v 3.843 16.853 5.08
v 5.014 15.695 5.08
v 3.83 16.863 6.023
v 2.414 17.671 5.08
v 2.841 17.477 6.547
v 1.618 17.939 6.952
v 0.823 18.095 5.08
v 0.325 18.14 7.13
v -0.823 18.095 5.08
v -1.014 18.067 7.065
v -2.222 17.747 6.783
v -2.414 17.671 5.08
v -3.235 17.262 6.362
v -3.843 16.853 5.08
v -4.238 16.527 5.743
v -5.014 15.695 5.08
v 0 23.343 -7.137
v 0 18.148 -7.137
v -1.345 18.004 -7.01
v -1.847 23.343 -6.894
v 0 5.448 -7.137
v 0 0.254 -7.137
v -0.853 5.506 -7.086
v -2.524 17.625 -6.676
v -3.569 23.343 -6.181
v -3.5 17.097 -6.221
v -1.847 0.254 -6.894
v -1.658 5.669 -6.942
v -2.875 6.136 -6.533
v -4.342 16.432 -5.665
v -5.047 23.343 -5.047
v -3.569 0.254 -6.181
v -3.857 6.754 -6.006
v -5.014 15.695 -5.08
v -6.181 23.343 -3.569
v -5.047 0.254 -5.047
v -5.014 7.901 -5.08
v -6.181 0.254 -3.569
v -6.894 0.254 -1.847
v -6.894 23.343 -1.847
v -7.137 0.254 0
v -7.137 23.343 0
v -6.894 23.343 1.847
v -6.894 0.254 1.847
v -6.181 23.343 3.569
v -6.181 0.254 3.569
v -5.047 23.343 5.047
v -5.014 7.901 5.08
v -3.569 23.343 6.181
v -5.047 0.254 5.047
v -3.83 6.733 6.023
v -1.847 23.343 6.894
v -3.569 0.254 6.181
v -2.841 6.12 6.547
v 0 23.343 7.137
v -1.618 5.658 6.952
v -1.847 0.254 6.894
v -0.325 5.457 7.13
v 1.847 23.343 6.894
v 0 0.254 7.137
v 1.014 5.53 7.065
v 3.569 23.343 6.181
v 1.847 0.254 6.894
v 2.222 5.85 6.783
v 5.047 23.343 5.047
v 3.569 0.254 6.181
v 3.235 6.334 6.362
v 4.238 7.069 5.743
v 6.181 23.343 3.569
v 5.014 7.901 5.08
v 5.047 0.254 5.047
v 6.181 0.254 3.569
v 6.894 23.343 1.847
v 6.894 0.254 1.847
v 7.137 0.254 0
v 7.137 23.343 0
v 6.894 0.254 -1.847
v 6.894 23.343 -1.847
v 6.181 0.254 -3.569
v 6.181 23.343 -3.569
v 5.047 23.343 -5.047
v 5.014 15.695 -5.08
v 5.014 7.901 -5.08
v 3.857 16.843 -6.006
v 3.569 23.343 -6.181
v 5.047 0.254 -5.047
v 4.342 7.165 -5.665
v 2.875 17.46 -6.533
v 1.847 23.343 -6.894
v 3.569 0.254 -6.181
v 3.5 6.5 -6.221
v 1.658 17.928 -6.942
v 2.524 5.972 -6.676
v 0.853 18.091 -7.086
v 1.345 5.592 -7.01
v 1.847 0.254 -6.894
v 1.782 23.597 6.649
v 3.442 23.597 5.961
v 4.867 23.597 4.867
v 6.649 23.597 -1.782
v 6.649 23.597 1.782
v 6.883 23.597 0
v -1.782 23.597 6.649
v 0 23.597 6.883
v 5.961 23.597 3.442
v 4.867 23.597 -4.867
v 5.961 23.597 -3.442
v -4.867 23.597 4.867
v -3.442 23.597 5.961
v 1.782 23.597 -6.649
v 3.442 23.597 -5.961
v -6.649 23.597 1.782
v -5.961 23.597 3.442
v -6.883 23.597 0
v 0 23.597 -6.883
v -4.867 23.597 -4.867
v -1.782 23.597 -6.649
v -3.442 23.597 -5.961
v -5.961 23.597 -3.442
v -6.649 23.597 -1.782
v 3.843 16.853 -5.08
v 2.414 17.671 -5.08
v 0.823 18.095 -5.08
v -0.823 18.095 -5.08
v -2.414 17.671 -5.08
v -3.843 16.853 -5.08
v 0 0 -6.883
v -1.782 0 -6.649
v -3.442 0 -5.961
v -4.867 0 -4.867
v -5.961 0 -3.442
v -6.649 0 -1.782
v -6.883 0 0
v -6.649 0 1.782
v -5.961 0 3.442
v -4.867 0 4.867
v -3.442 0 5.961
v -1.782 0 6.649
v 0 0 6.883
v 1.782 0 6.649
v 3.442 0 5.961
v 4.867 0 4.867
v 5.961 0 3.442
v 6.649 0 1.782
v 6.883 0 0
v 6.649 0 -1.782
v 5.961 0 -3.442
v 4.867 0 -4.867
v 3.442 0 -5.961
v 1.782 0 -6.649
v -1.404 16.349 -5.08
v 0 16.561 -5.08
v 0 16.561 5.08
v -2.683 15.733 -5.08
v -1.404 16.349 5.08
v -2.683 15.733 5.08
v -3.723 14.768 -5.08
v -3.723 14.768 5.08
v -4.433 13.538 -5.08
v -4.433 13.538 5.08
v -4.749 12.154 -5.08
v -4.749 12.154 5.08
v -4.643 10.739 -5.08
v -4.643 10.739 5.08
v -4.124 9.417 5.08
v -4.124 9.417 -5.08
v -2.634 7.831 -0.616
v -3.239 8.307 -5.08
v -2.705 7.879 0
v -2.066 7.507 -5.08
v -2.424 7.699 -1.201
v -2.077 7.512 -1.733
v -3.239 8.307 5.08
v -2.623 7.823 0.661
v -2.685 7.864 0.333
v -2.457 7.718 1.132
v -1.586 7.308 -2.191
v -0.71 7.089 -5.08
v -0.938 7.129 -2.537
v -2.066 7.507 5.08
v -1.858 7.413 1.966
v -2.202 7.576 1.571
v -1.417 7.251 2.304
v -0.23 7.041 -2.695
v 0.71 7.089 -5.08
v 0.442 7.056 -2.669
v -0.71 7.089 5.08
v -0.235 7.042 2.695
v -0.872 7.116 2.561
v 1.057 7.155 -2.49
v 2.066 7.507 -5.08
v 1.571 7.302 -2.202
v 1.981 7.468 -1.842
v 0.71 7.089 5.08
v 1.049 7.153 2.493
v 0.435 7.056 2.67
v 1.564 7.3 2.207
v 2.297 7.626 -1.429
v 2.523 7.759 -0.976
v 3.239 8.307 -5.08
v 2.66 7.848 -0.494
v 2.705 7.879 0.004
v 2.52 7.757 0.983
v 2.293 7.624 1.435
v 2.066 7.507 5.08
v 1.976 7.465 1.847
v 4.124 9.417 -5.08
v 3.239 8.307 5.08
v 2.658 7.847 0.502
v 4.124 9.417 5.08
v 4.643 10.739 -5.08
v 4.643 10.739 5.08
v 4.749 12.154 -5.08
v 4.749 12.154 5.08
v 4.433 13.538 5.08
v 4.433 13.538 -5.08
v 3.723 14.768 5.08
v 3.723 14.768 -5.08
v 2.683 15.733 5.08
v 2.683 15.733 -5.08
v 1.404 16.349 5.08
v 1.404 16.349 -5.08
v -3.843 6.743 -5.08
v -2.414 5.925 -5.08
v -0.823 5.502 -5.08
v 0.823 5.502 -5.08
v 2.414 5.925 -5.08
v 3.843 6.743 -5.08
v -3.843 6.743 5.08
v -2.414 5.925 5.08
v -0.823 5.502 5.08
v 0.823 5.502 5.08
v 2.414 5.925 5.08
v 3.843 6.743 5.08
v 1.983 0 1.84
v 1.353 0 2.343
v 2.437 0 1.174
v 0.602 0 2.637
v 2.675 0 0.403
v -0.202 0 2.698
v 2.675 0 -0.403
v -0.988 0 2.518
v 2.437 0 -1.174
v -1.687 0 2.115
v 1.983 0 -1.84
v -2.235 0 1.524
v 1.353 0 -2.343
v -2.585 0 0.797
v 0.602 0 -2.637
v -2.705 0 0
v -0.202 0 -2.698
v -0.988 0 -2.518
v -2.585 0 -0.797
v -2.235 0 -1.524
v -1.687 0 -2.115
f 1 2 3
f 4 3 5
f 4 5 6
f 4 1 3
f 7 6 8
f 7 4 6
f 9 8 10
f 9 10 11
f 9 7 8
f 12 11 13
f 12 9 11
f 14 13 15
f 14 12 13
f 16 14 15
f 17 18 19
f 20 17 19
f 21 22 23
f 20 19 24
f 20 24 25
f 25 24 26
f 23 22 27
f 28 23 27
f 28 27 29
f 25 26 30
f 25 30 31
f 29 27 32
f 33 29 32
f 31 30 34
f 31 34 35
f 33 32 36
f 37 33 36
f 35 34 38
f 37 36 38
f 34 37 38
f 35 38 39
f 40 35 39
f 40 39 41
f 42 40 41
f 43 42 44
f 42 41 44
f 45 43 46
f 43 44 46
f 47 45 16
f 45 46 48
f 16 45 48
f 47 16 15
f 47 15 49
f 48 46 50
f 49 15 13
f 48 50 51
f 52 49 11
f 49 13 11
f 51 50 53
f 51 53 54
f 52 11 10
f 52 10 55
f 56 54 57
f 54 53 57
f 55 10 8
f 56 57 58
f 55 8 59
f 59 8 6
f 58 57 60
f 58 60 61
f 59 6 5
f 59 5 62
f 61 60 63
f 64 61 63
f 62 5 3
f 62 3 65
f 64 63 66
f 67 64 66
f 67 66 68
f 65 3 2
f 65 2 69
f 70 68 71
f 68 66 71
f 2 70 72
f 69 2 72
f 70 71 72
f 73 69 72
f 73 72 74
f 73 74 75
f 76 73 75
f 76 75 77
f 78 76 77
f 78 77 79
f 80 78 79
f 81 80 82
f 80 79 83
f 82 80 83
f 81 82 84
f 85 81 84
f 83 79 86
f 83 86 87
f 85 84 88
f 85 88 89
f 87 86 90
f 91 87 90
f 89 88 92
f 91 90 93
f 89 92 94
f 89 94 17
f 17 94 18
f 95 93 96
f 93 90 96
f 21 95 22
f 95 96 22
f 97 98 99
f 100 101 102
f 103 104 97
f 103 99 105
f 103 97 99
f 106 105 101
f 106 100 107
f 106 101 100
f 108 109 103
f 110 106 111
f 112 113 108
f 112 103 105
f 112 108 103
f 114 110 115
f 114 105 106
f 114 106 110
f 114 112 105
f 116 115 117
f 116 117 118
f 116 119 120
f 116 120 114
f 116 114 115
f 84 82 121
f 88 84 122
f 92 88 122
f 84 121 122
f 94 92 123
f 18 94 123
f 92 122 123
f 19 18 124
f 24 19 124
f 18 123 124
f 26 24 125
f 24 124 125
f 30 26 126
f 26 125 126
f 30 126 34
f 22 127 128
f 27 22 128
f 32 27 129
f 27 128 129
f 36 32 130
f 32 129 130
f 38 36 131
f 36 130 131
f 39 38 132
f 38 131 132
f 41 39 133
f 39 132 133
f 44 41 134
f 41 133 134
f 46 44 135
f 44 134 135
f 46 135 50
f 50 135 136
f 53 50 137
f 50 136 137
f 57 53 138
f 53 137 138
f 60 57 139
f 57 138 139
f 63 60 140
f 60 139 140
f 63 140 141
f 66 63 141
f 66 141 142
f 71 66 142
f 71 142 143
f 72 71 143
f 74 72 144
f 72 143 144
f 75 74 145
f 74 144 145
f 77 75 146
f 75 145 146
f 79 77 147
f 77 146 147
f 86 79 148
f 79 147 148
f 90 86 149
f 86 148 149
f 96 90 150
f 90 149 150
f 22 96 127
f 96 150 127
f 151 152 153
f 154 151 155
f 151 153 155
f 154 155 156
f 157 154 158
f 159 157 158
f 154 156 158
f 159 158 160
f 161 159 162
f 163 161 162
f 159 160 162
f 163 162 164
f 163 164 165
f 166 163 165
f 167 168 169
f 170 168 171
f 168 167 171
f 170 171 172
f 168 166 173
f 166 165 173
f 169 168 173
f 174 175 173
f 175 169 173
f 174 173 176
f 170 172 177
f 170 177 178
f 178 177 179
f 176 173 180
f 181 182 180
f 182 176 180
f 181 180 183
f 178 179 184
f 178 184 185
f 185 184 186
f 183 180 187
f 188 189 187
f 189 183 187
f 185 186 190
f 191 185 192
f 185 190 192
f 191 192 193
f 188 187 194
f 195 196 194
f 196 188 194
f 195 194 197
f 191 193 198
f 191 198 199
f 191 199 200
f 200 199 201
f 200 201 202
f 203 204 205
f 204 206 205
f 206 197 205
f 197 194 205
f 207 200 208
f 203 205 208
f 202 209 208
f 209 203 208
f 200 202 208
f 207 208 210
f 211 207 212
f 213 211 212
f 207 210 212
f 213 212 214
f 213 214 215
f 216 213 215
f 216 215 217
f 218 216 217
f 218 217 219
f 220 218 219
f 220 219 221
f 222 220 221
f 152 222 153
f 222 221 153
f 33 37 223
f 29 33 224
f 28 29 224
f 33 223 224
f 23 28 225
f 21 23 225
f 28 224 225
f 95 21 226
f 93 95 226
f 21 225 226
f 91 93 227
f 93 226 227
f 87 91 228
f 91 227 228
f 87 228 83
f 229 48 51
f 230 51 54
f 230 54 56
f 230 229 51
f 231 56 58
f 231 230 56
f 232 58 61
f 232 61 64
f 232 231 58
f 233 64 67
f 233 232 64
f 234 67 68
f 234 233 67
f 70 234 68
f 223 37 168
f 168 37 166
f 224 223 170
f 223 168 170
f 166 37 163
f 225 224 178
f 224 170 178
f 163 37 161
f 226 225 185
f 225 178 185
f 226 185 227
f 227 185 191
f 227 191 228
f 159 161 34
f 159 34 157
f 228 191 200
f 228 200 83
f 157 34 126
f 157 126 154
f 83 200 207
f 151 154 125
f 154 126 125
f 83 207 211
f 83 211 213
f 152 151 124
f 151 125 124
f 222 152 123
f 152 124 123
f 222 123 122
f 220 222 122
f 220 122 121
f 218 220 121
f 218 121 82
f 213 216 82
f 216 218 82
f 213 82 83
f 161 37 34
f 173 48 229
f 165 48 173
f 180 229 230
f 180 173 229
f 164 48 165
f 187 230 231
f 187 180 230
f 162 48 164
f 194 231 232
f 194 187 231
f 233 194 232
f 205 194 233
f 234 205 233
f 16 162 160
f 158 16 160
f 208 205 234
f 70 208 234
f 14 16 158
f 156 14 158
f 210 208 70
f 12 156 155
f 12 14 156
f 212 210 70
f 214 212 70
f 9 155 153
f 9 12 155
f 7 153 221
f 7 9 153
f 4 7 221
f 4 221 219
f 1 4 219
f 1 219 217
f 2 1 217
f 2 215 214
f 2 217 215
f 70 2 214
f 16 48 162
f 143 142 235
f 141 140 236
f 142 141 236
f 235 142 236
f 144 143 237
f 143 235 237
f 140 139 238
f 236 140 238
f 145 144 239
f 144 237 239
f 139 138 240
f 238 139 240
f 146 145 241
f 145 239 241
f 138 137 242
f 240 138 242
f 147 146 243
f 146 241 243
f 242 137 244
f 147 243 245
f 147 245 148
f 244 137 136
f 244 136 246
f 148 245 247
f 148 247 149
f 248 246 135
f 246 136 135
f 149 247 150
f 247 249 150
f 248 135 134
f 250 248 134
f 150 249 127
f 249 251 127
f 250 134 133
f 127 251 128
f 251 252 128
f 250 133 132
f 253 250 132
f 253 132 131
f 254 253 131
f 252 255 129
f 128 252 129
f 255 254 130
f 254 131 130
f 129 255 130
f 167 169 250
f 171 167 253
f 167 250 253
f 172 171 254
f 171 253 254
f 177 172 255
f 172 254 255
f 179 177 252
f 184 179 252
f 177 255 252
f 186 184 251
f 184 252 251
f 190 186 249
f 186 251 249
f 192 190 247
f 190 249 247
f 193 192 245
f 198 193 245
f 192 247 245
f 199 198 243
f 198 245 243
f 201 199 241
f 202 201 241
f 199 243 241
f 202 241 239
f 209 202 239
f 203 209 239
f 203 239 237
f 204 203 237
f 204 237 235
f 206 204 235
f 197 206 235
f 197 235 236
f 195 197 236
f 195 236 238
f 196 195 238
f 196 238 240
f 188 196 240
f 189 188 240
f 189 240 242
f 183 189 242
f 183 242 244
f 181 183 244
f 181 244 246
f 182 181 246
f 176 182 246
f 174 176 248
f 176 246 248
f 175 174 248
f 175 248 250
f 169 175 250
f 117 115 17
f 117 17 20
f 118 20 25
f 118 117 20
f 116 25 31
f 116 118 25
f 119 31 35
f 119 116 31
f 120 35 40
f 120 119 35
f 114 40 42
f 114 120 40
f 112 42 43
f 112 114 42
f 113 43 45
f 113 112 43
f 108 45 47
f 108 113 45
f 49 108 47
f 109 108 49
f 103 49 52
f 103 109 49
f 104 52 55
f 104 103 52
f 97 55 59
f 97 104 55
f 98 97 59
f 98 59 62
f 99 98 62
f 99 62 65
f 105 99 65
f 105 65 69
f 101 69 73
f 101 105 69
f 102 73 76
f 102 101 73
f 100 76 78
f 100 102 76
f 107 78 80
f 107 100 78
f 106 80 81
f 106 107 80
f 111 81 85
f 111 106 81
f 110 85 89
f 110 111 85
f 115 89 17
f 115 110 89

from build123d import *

# Parameters (mm, degrees)
SKETCH1_R                    = 7.1374
BOSS_EXTRUDE1_DEPTH          = 23.5966
CHAMFER1_SIZE                = 0.254
CHAMFER2_SIZE                = 0.254
SKETCH2_R                    = 4.7625
CUT_EXTRUDE1_DEPTH           = 7.1755
SKETCH3_R                    = 6.35
CUT_EXTRUDE2_DEPTH           = 28.513757958
F_1_4_28_TAPPED_HOLE1_REACH  = 27.665
F_1_4_28_TAPPED_HOLE1_BORE_R = 2.7051


with BuildPart() as part:
    # Sketch1 → Boss-Extrude1 (new body)
    with BuildSketch(Plane(origin=(0, 0, 0), x_dir=(1, 0, 0), z_dir=(0, 1, 0))):
        with Locations(Location((0, 0, 0), (0, 0, 90))):
            Circle(SKETCH1_R)
    extrude(amount=BOSS_EXTRUDE1_DEPTH)

    # Chamfer1
    chamfer1_edges = [part.edges().sort_by_distance(p)[0] for p in [
        (0, 0, 7.1374),
    ]]
    chamfer(chamfer1_edges, length=CHAMFER1_SIZE)

    # Chamfer2
    chamfer2_edges = [part.edges().sort_by_distance(p)[0] for p in [
        (0, 23.5966, 7.1374),
    ]]
    chamfer(chamfer2_edges, length=CHAMFER2_SIZE)

    # Sketch2 → Cut-Extrude1 (cut, symmetric)
    with BuildSketch(Plane.XY):
        with Locations(Location((0, 11.7983, 0), (0, 0, 89.999999998))):
            Circle(SKETCH2_R)
    extrude(amount=CUT_EXTRUDE1_DEPTH, both=True, mode=Mode.SUBTRACT)

    # Sketch3 → Cut-Extrude2 (cut, through all)
    with BuildSketch(Plane.XY.offset(5.08)):
        with Locations((0, 11.7983)):
            Circle(SKETCH3_R)
    cut_extrude2 = extrude(amount=CUT_EXTRUDE2_DEPTH, mode=Mode.SUBTRACT)

    # Mirror1: Cut-Extrude2 across plane
    add(cut_extrude2.mirror(Plane.XY), mode=Mode.SUBTRACT)

    # 1/4-28 Tapped Hole1 bore → 1/4-28 Tapped Hole1 (cut, up to next)
    with BuildSketch(Plane(origin=(0, 0, 0), x_dir=(-1, 0, 0), z_dir=(0, -1, 0)), mode=Mode.PRIVATE) as f_1_4_28_tapped_hole1_sk1:
        Circle(F_1_4_28_TAPPED_HOLE1_BORE_R)
    f_1_4_28_tapped_hole1_tool1 = extrude(f_1_4_28_tapped_hole1_sk1.sketch, amount=-F_1_4_28_TAPPED_HOLE1_REACH, mode=Mode.PRIVATE) & part.part
    add(f_1_4_28_tapped_hole1_tool1.solids().sort_by_distance((0, 0, 0))[0], mode=Mode.SUBTRACT)


solid = part.part
